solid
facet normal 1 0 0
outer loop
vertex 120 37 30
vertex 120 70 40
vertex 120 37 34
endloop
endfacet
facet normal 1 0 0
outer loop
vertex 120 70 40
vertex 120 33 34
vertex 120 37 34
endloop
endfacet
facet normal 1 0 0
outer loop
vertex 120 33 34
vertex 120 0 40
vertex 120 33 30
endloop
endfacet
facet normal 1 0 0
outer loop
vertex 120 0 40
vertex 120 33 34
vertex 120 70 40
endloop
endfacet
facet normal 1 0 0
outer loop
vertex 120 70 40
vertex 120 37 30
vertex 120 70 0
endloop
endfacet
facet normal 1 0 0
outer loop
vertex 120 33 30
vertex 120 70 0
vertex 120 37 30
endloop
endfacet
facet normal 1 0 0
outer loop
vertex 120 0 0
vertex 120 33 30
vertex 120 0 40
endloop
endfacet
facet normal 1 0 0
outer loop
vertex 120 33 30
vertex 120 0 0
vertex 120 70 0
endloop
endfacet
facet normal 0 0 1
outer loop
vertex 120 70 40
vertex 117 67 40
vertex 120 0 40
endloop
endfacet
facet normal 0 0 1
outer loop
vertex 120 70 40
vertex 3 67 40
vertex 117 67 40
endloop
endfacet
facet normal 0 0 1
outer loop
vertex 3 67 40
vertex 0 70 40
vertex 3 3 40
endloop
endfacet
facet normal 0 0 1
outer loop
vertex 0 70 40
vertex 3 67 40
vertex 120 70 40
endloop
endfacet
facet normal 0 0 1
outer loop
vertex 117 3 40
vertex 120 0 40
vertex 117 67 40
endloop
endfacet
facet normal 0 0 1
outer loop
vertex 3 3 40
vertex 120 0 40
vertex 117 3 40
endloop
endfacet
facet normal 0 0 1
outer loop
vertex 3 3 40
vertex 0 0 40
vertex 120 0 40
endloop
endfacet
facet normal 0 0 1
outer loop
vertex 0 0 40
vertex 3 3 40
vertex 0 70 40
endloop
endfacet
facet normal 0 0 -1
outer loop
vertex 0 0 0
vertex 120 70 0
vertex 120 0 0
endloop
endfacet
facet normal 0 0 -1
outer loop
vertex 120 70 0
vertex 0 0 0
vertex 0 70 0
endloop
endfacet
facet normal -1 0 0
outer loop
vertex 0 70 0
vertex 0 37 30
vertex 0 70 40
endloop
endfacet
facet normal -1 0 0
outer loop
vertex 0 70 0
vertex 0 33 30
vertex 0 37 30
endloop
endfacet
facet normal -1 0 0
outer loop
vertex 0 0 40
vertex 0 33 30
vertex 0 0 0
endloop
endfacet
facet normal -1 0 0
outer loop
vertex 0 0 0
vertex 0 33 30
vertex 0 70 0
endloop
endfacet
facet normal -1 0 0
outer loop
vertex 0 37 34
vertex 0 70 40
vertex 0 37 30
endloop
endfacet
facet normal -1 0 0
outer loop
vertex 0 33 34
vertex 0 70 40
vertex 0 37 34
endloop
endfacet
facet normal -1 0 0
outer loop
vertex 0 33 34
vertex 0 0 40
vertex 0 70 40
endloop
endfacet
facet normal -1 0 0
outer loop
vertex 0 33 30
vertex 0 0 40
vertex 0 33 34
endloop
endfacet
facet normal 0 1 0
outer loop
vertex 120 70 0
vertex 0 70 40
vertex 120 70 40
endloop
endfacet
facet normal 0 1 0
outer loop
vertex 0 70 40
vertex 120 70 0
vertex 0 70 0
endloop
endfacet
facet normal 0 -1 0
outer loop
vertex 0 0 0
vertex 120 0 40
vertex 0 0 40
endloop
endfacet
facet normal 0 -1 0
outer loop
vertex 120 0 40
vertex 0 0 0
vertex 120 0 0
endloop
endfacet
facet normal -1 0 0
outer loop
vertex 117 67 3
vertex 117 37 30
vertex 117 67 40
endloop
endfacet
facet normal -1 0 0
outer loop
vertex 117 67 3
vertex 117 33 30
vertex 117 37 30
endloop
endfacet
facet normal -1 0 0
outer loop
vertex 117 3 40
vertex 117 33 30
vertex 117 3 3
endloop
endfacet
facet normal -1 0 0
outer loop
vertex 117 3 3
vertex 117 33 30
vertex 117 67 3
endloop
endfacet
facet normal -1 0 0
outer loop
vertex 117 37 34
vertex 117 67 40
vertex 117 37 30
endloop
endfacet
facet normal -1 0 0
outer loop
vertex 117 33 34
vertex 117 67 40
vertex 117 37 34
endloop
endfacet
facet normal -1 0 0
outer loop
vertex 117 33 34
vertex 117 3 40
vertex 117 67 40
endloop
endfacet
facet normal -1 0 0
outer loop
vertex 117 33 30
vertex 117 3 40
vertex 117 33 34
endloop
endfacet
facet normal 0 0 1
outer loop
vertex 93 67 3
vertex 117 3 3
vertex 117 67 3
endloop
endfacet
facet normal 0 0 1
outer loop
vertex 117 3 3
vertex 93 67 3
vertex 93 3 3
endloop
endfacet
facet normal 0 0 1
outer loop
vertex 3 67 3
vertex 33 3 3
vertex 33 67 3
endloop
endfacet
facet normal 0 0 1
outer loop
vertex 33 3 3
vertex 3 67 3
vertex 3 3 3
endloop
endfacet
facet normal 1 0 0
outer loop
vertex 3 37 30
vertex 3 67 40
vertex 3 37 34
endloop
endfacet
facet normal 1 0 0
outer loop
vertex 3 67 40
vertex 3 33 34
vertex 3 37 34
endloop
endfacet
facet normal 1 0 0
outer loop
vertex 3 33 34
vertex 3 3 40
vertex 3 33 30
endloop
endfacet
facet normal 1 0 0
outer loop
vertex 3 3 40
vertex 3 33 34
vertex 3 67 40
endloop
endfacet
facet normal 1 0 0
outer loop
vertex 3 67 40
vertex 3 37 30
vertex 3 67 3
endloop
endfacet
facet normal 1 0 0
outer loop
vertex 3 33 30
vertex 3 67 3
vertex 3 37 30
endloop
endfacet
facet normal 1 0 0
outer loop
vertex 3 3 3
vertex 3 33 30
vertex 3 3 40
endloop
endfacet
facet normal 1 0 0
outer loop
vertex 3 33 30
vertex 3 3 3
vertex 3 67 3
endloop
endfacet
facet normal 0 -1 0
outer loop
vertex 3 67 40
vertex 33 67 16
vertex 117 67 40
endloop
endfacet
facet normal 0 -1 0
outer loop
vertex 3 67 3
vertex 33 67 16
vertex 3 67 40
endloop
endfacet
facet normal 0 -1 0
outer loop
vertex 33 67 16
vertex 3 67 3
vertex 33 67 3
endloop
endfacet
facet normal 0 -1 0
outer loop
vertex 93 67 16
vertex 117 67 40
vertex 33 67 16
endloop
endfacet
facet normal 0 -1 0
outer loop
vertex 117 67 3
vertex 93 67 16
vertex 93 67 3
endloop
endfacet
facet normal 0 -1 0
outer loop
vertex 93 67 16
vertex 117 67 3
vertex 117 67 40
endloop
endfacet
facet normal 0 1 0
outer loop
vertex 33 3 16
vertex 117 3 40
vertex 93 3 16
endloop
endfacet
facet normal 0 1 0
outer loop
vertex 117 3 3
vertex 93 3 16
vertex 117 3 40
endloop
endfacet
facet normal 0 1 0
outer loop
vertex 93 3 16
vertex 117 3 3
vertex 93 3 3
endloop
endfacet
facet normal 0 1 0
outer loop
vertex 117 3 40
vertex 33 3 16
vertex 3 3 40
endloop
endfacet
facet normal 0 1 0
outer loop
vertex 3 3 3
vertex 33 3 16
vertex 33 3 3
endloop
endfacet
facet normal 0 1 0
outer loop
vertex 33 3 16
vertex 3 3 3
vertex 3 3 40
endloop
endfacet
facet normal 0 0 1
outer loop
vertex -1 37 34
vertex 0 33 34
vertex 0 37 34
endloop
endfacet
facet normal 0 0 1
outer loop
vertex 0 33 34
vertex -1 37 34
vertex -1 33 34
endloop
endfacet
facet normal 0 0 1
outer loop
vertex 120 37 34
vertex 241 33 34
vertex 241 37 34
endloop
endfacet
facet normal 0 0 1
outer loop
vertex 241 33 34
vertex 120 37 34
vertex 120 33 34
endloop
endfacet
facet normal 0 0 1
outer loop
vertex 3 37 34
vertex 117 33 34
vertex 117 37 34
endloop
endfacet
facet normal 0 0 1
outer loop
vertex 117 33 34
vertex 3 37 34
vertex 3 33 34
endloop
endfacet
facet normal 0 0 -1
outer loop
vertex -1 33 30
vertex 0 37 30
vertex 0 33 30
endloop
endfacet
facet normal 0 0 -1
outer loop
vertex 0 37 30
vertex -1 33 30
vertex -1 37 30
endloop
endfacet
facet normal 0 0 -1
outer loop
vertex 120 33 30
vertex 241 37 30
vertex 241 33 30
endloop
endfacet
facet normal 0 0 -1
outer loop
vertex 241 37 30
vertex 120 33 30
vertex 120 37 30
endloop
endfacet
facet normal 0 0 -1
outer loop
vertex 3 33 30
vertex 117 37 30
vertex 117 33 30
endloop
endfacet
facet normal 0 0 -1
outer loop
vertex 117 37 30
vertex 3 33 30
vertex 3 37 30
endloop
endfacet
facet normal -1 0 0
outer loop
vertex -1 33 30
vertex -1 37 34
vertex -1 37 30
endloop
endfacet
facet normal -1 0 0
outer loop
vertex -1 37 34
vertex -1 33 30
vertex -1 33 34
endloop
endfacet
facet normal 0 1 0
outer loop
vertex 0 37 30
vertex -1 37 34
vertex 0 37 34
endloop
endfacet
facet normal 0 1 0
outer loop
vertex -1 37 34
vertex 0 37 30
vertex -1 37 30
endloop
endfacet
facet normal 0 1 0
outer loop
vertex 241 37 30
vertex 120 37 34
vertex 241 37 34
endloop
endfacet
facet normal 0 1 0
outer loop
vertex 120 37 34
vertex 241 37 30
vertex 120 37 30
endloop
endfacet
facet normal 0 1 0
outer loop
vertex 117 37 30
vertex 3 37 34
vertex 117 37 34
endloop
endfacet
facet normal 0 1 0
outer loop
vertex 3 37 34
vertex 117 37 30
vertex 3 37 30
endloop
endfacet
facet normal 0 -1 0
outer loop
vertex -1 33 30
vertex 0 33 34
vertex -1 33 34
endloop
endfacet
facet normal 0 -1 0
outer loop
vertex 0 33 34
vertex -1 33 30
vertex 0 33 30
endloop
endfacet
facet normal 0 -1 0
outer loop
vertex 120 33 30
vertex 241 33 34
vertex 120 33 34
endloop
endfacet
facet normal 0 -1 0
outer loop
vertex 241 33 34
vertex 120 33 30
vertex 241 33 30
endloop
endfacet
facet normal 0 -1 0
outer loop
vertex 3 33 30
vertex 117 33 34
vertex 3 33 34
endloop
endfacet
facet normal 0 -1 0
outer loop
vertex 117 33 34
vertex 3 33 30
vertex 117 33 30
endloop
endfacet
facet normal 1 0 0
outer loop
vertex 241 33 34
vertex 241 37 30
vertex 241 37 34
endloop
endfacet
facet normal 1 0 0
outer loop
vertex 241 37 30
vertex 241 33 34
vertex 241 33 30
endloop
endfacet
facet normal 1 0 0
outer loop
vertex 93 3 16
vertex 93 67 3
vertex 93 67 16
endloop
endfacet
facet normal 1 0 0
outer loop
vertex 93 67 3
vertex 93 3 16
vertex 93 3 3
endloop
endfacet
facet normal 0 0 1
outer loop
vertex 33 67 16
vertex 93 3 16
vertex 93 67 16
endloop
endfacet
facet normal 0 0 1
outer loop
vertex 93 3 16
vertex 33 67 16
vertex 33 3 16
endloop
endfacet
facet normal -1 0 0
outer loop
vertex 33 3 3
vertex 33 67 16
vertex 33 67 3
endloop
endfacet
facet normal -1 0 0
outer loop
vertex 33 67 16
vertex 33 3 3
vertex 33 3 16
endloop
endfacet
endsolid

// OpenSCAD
// Buffer tank for mini horizontal gel-electrophoresis box
// Outer dimensions: 120 mm (X) x 70 mm (Y) x 40 mm (Z)
// Wall thickness: 3 mm, floor thickness: 3 mm
// Platform: 60 mm long (X), full inner width (Y), top at z = 13 mm (10 mm above inner floor)

$fn = 64;

// Dimensions
outer_x = 120;
outer_y = 70;
outer_z = 40;
wall_thick = 3;
floor_thick = 3;
platform_length = 60;
platform_height = 13; // z = 13 mm from bottom
hole_dia = 2;
hole_z = 30;
hole_y = 0;

// Calculate inner dimensions
inner_x = outer_x - 2 * wall_thick;
inner_y = outer_y - 2 * wall_thick;
inner_z = outer_z - floor_thick;

// Buffer tank shell
module tank_shell() {
    difference() {
        // Outer shell
        cube([outer_x, outer_y, outer_z]);
        
        // Inner cavity (removes interior)
        translate([wall_thick, wall_thick, floor_thick])
            cube([inner_x, inner_y, inner_z]);
        
        // Remove platform area from the bottom (to create hollow under platform)
        // Platform is centered in X, so it starts at (outer_x - platform_length)/2
        platform_start_x = (outer_x - platform_length) / 2;
        translate([wall_thick + platform_start_x, wall_thick, floor_thick])
            cube([platform_length, inner_y, platform_height]);
    }
}

// Platform (solid raised platform)
module platform() {
    platform_start_x = (outer_x - platform_length) / 2;
    translate([wall_thick + platform_start_x, wall_thick, floor_thick])
        cube([platform_length, inner_y, platform_height]);
}

// Electrode holes (through end walls at X = 0 and X = outer_x)
module electrode_holes() {
    // Left hole (at x = 0)
    translate([-1, (outer_y - hole_dia)/2 - 1, hole_z])
        cube([outer_x + 2, hole_dia + 2, hole_dia + 2]);
    
    // Right hole (at x = outer_x)
    translate([outer_x - 1, (outer_y - hole_dia)/2 - 1, hole_z])
        cube([outer_x + 2, hole_dia + 2, hole_dia + 2]);
}

// Build the buffer tank
module buffer_tank() {
    union() {
        // Tank shell
        tank_shell();
        
        // Platform
        platform();
        
        // Electrode holes (cut through end walls)
        electrode_holes();
    }
}

// Render the buffer tank
buffer_tank();
